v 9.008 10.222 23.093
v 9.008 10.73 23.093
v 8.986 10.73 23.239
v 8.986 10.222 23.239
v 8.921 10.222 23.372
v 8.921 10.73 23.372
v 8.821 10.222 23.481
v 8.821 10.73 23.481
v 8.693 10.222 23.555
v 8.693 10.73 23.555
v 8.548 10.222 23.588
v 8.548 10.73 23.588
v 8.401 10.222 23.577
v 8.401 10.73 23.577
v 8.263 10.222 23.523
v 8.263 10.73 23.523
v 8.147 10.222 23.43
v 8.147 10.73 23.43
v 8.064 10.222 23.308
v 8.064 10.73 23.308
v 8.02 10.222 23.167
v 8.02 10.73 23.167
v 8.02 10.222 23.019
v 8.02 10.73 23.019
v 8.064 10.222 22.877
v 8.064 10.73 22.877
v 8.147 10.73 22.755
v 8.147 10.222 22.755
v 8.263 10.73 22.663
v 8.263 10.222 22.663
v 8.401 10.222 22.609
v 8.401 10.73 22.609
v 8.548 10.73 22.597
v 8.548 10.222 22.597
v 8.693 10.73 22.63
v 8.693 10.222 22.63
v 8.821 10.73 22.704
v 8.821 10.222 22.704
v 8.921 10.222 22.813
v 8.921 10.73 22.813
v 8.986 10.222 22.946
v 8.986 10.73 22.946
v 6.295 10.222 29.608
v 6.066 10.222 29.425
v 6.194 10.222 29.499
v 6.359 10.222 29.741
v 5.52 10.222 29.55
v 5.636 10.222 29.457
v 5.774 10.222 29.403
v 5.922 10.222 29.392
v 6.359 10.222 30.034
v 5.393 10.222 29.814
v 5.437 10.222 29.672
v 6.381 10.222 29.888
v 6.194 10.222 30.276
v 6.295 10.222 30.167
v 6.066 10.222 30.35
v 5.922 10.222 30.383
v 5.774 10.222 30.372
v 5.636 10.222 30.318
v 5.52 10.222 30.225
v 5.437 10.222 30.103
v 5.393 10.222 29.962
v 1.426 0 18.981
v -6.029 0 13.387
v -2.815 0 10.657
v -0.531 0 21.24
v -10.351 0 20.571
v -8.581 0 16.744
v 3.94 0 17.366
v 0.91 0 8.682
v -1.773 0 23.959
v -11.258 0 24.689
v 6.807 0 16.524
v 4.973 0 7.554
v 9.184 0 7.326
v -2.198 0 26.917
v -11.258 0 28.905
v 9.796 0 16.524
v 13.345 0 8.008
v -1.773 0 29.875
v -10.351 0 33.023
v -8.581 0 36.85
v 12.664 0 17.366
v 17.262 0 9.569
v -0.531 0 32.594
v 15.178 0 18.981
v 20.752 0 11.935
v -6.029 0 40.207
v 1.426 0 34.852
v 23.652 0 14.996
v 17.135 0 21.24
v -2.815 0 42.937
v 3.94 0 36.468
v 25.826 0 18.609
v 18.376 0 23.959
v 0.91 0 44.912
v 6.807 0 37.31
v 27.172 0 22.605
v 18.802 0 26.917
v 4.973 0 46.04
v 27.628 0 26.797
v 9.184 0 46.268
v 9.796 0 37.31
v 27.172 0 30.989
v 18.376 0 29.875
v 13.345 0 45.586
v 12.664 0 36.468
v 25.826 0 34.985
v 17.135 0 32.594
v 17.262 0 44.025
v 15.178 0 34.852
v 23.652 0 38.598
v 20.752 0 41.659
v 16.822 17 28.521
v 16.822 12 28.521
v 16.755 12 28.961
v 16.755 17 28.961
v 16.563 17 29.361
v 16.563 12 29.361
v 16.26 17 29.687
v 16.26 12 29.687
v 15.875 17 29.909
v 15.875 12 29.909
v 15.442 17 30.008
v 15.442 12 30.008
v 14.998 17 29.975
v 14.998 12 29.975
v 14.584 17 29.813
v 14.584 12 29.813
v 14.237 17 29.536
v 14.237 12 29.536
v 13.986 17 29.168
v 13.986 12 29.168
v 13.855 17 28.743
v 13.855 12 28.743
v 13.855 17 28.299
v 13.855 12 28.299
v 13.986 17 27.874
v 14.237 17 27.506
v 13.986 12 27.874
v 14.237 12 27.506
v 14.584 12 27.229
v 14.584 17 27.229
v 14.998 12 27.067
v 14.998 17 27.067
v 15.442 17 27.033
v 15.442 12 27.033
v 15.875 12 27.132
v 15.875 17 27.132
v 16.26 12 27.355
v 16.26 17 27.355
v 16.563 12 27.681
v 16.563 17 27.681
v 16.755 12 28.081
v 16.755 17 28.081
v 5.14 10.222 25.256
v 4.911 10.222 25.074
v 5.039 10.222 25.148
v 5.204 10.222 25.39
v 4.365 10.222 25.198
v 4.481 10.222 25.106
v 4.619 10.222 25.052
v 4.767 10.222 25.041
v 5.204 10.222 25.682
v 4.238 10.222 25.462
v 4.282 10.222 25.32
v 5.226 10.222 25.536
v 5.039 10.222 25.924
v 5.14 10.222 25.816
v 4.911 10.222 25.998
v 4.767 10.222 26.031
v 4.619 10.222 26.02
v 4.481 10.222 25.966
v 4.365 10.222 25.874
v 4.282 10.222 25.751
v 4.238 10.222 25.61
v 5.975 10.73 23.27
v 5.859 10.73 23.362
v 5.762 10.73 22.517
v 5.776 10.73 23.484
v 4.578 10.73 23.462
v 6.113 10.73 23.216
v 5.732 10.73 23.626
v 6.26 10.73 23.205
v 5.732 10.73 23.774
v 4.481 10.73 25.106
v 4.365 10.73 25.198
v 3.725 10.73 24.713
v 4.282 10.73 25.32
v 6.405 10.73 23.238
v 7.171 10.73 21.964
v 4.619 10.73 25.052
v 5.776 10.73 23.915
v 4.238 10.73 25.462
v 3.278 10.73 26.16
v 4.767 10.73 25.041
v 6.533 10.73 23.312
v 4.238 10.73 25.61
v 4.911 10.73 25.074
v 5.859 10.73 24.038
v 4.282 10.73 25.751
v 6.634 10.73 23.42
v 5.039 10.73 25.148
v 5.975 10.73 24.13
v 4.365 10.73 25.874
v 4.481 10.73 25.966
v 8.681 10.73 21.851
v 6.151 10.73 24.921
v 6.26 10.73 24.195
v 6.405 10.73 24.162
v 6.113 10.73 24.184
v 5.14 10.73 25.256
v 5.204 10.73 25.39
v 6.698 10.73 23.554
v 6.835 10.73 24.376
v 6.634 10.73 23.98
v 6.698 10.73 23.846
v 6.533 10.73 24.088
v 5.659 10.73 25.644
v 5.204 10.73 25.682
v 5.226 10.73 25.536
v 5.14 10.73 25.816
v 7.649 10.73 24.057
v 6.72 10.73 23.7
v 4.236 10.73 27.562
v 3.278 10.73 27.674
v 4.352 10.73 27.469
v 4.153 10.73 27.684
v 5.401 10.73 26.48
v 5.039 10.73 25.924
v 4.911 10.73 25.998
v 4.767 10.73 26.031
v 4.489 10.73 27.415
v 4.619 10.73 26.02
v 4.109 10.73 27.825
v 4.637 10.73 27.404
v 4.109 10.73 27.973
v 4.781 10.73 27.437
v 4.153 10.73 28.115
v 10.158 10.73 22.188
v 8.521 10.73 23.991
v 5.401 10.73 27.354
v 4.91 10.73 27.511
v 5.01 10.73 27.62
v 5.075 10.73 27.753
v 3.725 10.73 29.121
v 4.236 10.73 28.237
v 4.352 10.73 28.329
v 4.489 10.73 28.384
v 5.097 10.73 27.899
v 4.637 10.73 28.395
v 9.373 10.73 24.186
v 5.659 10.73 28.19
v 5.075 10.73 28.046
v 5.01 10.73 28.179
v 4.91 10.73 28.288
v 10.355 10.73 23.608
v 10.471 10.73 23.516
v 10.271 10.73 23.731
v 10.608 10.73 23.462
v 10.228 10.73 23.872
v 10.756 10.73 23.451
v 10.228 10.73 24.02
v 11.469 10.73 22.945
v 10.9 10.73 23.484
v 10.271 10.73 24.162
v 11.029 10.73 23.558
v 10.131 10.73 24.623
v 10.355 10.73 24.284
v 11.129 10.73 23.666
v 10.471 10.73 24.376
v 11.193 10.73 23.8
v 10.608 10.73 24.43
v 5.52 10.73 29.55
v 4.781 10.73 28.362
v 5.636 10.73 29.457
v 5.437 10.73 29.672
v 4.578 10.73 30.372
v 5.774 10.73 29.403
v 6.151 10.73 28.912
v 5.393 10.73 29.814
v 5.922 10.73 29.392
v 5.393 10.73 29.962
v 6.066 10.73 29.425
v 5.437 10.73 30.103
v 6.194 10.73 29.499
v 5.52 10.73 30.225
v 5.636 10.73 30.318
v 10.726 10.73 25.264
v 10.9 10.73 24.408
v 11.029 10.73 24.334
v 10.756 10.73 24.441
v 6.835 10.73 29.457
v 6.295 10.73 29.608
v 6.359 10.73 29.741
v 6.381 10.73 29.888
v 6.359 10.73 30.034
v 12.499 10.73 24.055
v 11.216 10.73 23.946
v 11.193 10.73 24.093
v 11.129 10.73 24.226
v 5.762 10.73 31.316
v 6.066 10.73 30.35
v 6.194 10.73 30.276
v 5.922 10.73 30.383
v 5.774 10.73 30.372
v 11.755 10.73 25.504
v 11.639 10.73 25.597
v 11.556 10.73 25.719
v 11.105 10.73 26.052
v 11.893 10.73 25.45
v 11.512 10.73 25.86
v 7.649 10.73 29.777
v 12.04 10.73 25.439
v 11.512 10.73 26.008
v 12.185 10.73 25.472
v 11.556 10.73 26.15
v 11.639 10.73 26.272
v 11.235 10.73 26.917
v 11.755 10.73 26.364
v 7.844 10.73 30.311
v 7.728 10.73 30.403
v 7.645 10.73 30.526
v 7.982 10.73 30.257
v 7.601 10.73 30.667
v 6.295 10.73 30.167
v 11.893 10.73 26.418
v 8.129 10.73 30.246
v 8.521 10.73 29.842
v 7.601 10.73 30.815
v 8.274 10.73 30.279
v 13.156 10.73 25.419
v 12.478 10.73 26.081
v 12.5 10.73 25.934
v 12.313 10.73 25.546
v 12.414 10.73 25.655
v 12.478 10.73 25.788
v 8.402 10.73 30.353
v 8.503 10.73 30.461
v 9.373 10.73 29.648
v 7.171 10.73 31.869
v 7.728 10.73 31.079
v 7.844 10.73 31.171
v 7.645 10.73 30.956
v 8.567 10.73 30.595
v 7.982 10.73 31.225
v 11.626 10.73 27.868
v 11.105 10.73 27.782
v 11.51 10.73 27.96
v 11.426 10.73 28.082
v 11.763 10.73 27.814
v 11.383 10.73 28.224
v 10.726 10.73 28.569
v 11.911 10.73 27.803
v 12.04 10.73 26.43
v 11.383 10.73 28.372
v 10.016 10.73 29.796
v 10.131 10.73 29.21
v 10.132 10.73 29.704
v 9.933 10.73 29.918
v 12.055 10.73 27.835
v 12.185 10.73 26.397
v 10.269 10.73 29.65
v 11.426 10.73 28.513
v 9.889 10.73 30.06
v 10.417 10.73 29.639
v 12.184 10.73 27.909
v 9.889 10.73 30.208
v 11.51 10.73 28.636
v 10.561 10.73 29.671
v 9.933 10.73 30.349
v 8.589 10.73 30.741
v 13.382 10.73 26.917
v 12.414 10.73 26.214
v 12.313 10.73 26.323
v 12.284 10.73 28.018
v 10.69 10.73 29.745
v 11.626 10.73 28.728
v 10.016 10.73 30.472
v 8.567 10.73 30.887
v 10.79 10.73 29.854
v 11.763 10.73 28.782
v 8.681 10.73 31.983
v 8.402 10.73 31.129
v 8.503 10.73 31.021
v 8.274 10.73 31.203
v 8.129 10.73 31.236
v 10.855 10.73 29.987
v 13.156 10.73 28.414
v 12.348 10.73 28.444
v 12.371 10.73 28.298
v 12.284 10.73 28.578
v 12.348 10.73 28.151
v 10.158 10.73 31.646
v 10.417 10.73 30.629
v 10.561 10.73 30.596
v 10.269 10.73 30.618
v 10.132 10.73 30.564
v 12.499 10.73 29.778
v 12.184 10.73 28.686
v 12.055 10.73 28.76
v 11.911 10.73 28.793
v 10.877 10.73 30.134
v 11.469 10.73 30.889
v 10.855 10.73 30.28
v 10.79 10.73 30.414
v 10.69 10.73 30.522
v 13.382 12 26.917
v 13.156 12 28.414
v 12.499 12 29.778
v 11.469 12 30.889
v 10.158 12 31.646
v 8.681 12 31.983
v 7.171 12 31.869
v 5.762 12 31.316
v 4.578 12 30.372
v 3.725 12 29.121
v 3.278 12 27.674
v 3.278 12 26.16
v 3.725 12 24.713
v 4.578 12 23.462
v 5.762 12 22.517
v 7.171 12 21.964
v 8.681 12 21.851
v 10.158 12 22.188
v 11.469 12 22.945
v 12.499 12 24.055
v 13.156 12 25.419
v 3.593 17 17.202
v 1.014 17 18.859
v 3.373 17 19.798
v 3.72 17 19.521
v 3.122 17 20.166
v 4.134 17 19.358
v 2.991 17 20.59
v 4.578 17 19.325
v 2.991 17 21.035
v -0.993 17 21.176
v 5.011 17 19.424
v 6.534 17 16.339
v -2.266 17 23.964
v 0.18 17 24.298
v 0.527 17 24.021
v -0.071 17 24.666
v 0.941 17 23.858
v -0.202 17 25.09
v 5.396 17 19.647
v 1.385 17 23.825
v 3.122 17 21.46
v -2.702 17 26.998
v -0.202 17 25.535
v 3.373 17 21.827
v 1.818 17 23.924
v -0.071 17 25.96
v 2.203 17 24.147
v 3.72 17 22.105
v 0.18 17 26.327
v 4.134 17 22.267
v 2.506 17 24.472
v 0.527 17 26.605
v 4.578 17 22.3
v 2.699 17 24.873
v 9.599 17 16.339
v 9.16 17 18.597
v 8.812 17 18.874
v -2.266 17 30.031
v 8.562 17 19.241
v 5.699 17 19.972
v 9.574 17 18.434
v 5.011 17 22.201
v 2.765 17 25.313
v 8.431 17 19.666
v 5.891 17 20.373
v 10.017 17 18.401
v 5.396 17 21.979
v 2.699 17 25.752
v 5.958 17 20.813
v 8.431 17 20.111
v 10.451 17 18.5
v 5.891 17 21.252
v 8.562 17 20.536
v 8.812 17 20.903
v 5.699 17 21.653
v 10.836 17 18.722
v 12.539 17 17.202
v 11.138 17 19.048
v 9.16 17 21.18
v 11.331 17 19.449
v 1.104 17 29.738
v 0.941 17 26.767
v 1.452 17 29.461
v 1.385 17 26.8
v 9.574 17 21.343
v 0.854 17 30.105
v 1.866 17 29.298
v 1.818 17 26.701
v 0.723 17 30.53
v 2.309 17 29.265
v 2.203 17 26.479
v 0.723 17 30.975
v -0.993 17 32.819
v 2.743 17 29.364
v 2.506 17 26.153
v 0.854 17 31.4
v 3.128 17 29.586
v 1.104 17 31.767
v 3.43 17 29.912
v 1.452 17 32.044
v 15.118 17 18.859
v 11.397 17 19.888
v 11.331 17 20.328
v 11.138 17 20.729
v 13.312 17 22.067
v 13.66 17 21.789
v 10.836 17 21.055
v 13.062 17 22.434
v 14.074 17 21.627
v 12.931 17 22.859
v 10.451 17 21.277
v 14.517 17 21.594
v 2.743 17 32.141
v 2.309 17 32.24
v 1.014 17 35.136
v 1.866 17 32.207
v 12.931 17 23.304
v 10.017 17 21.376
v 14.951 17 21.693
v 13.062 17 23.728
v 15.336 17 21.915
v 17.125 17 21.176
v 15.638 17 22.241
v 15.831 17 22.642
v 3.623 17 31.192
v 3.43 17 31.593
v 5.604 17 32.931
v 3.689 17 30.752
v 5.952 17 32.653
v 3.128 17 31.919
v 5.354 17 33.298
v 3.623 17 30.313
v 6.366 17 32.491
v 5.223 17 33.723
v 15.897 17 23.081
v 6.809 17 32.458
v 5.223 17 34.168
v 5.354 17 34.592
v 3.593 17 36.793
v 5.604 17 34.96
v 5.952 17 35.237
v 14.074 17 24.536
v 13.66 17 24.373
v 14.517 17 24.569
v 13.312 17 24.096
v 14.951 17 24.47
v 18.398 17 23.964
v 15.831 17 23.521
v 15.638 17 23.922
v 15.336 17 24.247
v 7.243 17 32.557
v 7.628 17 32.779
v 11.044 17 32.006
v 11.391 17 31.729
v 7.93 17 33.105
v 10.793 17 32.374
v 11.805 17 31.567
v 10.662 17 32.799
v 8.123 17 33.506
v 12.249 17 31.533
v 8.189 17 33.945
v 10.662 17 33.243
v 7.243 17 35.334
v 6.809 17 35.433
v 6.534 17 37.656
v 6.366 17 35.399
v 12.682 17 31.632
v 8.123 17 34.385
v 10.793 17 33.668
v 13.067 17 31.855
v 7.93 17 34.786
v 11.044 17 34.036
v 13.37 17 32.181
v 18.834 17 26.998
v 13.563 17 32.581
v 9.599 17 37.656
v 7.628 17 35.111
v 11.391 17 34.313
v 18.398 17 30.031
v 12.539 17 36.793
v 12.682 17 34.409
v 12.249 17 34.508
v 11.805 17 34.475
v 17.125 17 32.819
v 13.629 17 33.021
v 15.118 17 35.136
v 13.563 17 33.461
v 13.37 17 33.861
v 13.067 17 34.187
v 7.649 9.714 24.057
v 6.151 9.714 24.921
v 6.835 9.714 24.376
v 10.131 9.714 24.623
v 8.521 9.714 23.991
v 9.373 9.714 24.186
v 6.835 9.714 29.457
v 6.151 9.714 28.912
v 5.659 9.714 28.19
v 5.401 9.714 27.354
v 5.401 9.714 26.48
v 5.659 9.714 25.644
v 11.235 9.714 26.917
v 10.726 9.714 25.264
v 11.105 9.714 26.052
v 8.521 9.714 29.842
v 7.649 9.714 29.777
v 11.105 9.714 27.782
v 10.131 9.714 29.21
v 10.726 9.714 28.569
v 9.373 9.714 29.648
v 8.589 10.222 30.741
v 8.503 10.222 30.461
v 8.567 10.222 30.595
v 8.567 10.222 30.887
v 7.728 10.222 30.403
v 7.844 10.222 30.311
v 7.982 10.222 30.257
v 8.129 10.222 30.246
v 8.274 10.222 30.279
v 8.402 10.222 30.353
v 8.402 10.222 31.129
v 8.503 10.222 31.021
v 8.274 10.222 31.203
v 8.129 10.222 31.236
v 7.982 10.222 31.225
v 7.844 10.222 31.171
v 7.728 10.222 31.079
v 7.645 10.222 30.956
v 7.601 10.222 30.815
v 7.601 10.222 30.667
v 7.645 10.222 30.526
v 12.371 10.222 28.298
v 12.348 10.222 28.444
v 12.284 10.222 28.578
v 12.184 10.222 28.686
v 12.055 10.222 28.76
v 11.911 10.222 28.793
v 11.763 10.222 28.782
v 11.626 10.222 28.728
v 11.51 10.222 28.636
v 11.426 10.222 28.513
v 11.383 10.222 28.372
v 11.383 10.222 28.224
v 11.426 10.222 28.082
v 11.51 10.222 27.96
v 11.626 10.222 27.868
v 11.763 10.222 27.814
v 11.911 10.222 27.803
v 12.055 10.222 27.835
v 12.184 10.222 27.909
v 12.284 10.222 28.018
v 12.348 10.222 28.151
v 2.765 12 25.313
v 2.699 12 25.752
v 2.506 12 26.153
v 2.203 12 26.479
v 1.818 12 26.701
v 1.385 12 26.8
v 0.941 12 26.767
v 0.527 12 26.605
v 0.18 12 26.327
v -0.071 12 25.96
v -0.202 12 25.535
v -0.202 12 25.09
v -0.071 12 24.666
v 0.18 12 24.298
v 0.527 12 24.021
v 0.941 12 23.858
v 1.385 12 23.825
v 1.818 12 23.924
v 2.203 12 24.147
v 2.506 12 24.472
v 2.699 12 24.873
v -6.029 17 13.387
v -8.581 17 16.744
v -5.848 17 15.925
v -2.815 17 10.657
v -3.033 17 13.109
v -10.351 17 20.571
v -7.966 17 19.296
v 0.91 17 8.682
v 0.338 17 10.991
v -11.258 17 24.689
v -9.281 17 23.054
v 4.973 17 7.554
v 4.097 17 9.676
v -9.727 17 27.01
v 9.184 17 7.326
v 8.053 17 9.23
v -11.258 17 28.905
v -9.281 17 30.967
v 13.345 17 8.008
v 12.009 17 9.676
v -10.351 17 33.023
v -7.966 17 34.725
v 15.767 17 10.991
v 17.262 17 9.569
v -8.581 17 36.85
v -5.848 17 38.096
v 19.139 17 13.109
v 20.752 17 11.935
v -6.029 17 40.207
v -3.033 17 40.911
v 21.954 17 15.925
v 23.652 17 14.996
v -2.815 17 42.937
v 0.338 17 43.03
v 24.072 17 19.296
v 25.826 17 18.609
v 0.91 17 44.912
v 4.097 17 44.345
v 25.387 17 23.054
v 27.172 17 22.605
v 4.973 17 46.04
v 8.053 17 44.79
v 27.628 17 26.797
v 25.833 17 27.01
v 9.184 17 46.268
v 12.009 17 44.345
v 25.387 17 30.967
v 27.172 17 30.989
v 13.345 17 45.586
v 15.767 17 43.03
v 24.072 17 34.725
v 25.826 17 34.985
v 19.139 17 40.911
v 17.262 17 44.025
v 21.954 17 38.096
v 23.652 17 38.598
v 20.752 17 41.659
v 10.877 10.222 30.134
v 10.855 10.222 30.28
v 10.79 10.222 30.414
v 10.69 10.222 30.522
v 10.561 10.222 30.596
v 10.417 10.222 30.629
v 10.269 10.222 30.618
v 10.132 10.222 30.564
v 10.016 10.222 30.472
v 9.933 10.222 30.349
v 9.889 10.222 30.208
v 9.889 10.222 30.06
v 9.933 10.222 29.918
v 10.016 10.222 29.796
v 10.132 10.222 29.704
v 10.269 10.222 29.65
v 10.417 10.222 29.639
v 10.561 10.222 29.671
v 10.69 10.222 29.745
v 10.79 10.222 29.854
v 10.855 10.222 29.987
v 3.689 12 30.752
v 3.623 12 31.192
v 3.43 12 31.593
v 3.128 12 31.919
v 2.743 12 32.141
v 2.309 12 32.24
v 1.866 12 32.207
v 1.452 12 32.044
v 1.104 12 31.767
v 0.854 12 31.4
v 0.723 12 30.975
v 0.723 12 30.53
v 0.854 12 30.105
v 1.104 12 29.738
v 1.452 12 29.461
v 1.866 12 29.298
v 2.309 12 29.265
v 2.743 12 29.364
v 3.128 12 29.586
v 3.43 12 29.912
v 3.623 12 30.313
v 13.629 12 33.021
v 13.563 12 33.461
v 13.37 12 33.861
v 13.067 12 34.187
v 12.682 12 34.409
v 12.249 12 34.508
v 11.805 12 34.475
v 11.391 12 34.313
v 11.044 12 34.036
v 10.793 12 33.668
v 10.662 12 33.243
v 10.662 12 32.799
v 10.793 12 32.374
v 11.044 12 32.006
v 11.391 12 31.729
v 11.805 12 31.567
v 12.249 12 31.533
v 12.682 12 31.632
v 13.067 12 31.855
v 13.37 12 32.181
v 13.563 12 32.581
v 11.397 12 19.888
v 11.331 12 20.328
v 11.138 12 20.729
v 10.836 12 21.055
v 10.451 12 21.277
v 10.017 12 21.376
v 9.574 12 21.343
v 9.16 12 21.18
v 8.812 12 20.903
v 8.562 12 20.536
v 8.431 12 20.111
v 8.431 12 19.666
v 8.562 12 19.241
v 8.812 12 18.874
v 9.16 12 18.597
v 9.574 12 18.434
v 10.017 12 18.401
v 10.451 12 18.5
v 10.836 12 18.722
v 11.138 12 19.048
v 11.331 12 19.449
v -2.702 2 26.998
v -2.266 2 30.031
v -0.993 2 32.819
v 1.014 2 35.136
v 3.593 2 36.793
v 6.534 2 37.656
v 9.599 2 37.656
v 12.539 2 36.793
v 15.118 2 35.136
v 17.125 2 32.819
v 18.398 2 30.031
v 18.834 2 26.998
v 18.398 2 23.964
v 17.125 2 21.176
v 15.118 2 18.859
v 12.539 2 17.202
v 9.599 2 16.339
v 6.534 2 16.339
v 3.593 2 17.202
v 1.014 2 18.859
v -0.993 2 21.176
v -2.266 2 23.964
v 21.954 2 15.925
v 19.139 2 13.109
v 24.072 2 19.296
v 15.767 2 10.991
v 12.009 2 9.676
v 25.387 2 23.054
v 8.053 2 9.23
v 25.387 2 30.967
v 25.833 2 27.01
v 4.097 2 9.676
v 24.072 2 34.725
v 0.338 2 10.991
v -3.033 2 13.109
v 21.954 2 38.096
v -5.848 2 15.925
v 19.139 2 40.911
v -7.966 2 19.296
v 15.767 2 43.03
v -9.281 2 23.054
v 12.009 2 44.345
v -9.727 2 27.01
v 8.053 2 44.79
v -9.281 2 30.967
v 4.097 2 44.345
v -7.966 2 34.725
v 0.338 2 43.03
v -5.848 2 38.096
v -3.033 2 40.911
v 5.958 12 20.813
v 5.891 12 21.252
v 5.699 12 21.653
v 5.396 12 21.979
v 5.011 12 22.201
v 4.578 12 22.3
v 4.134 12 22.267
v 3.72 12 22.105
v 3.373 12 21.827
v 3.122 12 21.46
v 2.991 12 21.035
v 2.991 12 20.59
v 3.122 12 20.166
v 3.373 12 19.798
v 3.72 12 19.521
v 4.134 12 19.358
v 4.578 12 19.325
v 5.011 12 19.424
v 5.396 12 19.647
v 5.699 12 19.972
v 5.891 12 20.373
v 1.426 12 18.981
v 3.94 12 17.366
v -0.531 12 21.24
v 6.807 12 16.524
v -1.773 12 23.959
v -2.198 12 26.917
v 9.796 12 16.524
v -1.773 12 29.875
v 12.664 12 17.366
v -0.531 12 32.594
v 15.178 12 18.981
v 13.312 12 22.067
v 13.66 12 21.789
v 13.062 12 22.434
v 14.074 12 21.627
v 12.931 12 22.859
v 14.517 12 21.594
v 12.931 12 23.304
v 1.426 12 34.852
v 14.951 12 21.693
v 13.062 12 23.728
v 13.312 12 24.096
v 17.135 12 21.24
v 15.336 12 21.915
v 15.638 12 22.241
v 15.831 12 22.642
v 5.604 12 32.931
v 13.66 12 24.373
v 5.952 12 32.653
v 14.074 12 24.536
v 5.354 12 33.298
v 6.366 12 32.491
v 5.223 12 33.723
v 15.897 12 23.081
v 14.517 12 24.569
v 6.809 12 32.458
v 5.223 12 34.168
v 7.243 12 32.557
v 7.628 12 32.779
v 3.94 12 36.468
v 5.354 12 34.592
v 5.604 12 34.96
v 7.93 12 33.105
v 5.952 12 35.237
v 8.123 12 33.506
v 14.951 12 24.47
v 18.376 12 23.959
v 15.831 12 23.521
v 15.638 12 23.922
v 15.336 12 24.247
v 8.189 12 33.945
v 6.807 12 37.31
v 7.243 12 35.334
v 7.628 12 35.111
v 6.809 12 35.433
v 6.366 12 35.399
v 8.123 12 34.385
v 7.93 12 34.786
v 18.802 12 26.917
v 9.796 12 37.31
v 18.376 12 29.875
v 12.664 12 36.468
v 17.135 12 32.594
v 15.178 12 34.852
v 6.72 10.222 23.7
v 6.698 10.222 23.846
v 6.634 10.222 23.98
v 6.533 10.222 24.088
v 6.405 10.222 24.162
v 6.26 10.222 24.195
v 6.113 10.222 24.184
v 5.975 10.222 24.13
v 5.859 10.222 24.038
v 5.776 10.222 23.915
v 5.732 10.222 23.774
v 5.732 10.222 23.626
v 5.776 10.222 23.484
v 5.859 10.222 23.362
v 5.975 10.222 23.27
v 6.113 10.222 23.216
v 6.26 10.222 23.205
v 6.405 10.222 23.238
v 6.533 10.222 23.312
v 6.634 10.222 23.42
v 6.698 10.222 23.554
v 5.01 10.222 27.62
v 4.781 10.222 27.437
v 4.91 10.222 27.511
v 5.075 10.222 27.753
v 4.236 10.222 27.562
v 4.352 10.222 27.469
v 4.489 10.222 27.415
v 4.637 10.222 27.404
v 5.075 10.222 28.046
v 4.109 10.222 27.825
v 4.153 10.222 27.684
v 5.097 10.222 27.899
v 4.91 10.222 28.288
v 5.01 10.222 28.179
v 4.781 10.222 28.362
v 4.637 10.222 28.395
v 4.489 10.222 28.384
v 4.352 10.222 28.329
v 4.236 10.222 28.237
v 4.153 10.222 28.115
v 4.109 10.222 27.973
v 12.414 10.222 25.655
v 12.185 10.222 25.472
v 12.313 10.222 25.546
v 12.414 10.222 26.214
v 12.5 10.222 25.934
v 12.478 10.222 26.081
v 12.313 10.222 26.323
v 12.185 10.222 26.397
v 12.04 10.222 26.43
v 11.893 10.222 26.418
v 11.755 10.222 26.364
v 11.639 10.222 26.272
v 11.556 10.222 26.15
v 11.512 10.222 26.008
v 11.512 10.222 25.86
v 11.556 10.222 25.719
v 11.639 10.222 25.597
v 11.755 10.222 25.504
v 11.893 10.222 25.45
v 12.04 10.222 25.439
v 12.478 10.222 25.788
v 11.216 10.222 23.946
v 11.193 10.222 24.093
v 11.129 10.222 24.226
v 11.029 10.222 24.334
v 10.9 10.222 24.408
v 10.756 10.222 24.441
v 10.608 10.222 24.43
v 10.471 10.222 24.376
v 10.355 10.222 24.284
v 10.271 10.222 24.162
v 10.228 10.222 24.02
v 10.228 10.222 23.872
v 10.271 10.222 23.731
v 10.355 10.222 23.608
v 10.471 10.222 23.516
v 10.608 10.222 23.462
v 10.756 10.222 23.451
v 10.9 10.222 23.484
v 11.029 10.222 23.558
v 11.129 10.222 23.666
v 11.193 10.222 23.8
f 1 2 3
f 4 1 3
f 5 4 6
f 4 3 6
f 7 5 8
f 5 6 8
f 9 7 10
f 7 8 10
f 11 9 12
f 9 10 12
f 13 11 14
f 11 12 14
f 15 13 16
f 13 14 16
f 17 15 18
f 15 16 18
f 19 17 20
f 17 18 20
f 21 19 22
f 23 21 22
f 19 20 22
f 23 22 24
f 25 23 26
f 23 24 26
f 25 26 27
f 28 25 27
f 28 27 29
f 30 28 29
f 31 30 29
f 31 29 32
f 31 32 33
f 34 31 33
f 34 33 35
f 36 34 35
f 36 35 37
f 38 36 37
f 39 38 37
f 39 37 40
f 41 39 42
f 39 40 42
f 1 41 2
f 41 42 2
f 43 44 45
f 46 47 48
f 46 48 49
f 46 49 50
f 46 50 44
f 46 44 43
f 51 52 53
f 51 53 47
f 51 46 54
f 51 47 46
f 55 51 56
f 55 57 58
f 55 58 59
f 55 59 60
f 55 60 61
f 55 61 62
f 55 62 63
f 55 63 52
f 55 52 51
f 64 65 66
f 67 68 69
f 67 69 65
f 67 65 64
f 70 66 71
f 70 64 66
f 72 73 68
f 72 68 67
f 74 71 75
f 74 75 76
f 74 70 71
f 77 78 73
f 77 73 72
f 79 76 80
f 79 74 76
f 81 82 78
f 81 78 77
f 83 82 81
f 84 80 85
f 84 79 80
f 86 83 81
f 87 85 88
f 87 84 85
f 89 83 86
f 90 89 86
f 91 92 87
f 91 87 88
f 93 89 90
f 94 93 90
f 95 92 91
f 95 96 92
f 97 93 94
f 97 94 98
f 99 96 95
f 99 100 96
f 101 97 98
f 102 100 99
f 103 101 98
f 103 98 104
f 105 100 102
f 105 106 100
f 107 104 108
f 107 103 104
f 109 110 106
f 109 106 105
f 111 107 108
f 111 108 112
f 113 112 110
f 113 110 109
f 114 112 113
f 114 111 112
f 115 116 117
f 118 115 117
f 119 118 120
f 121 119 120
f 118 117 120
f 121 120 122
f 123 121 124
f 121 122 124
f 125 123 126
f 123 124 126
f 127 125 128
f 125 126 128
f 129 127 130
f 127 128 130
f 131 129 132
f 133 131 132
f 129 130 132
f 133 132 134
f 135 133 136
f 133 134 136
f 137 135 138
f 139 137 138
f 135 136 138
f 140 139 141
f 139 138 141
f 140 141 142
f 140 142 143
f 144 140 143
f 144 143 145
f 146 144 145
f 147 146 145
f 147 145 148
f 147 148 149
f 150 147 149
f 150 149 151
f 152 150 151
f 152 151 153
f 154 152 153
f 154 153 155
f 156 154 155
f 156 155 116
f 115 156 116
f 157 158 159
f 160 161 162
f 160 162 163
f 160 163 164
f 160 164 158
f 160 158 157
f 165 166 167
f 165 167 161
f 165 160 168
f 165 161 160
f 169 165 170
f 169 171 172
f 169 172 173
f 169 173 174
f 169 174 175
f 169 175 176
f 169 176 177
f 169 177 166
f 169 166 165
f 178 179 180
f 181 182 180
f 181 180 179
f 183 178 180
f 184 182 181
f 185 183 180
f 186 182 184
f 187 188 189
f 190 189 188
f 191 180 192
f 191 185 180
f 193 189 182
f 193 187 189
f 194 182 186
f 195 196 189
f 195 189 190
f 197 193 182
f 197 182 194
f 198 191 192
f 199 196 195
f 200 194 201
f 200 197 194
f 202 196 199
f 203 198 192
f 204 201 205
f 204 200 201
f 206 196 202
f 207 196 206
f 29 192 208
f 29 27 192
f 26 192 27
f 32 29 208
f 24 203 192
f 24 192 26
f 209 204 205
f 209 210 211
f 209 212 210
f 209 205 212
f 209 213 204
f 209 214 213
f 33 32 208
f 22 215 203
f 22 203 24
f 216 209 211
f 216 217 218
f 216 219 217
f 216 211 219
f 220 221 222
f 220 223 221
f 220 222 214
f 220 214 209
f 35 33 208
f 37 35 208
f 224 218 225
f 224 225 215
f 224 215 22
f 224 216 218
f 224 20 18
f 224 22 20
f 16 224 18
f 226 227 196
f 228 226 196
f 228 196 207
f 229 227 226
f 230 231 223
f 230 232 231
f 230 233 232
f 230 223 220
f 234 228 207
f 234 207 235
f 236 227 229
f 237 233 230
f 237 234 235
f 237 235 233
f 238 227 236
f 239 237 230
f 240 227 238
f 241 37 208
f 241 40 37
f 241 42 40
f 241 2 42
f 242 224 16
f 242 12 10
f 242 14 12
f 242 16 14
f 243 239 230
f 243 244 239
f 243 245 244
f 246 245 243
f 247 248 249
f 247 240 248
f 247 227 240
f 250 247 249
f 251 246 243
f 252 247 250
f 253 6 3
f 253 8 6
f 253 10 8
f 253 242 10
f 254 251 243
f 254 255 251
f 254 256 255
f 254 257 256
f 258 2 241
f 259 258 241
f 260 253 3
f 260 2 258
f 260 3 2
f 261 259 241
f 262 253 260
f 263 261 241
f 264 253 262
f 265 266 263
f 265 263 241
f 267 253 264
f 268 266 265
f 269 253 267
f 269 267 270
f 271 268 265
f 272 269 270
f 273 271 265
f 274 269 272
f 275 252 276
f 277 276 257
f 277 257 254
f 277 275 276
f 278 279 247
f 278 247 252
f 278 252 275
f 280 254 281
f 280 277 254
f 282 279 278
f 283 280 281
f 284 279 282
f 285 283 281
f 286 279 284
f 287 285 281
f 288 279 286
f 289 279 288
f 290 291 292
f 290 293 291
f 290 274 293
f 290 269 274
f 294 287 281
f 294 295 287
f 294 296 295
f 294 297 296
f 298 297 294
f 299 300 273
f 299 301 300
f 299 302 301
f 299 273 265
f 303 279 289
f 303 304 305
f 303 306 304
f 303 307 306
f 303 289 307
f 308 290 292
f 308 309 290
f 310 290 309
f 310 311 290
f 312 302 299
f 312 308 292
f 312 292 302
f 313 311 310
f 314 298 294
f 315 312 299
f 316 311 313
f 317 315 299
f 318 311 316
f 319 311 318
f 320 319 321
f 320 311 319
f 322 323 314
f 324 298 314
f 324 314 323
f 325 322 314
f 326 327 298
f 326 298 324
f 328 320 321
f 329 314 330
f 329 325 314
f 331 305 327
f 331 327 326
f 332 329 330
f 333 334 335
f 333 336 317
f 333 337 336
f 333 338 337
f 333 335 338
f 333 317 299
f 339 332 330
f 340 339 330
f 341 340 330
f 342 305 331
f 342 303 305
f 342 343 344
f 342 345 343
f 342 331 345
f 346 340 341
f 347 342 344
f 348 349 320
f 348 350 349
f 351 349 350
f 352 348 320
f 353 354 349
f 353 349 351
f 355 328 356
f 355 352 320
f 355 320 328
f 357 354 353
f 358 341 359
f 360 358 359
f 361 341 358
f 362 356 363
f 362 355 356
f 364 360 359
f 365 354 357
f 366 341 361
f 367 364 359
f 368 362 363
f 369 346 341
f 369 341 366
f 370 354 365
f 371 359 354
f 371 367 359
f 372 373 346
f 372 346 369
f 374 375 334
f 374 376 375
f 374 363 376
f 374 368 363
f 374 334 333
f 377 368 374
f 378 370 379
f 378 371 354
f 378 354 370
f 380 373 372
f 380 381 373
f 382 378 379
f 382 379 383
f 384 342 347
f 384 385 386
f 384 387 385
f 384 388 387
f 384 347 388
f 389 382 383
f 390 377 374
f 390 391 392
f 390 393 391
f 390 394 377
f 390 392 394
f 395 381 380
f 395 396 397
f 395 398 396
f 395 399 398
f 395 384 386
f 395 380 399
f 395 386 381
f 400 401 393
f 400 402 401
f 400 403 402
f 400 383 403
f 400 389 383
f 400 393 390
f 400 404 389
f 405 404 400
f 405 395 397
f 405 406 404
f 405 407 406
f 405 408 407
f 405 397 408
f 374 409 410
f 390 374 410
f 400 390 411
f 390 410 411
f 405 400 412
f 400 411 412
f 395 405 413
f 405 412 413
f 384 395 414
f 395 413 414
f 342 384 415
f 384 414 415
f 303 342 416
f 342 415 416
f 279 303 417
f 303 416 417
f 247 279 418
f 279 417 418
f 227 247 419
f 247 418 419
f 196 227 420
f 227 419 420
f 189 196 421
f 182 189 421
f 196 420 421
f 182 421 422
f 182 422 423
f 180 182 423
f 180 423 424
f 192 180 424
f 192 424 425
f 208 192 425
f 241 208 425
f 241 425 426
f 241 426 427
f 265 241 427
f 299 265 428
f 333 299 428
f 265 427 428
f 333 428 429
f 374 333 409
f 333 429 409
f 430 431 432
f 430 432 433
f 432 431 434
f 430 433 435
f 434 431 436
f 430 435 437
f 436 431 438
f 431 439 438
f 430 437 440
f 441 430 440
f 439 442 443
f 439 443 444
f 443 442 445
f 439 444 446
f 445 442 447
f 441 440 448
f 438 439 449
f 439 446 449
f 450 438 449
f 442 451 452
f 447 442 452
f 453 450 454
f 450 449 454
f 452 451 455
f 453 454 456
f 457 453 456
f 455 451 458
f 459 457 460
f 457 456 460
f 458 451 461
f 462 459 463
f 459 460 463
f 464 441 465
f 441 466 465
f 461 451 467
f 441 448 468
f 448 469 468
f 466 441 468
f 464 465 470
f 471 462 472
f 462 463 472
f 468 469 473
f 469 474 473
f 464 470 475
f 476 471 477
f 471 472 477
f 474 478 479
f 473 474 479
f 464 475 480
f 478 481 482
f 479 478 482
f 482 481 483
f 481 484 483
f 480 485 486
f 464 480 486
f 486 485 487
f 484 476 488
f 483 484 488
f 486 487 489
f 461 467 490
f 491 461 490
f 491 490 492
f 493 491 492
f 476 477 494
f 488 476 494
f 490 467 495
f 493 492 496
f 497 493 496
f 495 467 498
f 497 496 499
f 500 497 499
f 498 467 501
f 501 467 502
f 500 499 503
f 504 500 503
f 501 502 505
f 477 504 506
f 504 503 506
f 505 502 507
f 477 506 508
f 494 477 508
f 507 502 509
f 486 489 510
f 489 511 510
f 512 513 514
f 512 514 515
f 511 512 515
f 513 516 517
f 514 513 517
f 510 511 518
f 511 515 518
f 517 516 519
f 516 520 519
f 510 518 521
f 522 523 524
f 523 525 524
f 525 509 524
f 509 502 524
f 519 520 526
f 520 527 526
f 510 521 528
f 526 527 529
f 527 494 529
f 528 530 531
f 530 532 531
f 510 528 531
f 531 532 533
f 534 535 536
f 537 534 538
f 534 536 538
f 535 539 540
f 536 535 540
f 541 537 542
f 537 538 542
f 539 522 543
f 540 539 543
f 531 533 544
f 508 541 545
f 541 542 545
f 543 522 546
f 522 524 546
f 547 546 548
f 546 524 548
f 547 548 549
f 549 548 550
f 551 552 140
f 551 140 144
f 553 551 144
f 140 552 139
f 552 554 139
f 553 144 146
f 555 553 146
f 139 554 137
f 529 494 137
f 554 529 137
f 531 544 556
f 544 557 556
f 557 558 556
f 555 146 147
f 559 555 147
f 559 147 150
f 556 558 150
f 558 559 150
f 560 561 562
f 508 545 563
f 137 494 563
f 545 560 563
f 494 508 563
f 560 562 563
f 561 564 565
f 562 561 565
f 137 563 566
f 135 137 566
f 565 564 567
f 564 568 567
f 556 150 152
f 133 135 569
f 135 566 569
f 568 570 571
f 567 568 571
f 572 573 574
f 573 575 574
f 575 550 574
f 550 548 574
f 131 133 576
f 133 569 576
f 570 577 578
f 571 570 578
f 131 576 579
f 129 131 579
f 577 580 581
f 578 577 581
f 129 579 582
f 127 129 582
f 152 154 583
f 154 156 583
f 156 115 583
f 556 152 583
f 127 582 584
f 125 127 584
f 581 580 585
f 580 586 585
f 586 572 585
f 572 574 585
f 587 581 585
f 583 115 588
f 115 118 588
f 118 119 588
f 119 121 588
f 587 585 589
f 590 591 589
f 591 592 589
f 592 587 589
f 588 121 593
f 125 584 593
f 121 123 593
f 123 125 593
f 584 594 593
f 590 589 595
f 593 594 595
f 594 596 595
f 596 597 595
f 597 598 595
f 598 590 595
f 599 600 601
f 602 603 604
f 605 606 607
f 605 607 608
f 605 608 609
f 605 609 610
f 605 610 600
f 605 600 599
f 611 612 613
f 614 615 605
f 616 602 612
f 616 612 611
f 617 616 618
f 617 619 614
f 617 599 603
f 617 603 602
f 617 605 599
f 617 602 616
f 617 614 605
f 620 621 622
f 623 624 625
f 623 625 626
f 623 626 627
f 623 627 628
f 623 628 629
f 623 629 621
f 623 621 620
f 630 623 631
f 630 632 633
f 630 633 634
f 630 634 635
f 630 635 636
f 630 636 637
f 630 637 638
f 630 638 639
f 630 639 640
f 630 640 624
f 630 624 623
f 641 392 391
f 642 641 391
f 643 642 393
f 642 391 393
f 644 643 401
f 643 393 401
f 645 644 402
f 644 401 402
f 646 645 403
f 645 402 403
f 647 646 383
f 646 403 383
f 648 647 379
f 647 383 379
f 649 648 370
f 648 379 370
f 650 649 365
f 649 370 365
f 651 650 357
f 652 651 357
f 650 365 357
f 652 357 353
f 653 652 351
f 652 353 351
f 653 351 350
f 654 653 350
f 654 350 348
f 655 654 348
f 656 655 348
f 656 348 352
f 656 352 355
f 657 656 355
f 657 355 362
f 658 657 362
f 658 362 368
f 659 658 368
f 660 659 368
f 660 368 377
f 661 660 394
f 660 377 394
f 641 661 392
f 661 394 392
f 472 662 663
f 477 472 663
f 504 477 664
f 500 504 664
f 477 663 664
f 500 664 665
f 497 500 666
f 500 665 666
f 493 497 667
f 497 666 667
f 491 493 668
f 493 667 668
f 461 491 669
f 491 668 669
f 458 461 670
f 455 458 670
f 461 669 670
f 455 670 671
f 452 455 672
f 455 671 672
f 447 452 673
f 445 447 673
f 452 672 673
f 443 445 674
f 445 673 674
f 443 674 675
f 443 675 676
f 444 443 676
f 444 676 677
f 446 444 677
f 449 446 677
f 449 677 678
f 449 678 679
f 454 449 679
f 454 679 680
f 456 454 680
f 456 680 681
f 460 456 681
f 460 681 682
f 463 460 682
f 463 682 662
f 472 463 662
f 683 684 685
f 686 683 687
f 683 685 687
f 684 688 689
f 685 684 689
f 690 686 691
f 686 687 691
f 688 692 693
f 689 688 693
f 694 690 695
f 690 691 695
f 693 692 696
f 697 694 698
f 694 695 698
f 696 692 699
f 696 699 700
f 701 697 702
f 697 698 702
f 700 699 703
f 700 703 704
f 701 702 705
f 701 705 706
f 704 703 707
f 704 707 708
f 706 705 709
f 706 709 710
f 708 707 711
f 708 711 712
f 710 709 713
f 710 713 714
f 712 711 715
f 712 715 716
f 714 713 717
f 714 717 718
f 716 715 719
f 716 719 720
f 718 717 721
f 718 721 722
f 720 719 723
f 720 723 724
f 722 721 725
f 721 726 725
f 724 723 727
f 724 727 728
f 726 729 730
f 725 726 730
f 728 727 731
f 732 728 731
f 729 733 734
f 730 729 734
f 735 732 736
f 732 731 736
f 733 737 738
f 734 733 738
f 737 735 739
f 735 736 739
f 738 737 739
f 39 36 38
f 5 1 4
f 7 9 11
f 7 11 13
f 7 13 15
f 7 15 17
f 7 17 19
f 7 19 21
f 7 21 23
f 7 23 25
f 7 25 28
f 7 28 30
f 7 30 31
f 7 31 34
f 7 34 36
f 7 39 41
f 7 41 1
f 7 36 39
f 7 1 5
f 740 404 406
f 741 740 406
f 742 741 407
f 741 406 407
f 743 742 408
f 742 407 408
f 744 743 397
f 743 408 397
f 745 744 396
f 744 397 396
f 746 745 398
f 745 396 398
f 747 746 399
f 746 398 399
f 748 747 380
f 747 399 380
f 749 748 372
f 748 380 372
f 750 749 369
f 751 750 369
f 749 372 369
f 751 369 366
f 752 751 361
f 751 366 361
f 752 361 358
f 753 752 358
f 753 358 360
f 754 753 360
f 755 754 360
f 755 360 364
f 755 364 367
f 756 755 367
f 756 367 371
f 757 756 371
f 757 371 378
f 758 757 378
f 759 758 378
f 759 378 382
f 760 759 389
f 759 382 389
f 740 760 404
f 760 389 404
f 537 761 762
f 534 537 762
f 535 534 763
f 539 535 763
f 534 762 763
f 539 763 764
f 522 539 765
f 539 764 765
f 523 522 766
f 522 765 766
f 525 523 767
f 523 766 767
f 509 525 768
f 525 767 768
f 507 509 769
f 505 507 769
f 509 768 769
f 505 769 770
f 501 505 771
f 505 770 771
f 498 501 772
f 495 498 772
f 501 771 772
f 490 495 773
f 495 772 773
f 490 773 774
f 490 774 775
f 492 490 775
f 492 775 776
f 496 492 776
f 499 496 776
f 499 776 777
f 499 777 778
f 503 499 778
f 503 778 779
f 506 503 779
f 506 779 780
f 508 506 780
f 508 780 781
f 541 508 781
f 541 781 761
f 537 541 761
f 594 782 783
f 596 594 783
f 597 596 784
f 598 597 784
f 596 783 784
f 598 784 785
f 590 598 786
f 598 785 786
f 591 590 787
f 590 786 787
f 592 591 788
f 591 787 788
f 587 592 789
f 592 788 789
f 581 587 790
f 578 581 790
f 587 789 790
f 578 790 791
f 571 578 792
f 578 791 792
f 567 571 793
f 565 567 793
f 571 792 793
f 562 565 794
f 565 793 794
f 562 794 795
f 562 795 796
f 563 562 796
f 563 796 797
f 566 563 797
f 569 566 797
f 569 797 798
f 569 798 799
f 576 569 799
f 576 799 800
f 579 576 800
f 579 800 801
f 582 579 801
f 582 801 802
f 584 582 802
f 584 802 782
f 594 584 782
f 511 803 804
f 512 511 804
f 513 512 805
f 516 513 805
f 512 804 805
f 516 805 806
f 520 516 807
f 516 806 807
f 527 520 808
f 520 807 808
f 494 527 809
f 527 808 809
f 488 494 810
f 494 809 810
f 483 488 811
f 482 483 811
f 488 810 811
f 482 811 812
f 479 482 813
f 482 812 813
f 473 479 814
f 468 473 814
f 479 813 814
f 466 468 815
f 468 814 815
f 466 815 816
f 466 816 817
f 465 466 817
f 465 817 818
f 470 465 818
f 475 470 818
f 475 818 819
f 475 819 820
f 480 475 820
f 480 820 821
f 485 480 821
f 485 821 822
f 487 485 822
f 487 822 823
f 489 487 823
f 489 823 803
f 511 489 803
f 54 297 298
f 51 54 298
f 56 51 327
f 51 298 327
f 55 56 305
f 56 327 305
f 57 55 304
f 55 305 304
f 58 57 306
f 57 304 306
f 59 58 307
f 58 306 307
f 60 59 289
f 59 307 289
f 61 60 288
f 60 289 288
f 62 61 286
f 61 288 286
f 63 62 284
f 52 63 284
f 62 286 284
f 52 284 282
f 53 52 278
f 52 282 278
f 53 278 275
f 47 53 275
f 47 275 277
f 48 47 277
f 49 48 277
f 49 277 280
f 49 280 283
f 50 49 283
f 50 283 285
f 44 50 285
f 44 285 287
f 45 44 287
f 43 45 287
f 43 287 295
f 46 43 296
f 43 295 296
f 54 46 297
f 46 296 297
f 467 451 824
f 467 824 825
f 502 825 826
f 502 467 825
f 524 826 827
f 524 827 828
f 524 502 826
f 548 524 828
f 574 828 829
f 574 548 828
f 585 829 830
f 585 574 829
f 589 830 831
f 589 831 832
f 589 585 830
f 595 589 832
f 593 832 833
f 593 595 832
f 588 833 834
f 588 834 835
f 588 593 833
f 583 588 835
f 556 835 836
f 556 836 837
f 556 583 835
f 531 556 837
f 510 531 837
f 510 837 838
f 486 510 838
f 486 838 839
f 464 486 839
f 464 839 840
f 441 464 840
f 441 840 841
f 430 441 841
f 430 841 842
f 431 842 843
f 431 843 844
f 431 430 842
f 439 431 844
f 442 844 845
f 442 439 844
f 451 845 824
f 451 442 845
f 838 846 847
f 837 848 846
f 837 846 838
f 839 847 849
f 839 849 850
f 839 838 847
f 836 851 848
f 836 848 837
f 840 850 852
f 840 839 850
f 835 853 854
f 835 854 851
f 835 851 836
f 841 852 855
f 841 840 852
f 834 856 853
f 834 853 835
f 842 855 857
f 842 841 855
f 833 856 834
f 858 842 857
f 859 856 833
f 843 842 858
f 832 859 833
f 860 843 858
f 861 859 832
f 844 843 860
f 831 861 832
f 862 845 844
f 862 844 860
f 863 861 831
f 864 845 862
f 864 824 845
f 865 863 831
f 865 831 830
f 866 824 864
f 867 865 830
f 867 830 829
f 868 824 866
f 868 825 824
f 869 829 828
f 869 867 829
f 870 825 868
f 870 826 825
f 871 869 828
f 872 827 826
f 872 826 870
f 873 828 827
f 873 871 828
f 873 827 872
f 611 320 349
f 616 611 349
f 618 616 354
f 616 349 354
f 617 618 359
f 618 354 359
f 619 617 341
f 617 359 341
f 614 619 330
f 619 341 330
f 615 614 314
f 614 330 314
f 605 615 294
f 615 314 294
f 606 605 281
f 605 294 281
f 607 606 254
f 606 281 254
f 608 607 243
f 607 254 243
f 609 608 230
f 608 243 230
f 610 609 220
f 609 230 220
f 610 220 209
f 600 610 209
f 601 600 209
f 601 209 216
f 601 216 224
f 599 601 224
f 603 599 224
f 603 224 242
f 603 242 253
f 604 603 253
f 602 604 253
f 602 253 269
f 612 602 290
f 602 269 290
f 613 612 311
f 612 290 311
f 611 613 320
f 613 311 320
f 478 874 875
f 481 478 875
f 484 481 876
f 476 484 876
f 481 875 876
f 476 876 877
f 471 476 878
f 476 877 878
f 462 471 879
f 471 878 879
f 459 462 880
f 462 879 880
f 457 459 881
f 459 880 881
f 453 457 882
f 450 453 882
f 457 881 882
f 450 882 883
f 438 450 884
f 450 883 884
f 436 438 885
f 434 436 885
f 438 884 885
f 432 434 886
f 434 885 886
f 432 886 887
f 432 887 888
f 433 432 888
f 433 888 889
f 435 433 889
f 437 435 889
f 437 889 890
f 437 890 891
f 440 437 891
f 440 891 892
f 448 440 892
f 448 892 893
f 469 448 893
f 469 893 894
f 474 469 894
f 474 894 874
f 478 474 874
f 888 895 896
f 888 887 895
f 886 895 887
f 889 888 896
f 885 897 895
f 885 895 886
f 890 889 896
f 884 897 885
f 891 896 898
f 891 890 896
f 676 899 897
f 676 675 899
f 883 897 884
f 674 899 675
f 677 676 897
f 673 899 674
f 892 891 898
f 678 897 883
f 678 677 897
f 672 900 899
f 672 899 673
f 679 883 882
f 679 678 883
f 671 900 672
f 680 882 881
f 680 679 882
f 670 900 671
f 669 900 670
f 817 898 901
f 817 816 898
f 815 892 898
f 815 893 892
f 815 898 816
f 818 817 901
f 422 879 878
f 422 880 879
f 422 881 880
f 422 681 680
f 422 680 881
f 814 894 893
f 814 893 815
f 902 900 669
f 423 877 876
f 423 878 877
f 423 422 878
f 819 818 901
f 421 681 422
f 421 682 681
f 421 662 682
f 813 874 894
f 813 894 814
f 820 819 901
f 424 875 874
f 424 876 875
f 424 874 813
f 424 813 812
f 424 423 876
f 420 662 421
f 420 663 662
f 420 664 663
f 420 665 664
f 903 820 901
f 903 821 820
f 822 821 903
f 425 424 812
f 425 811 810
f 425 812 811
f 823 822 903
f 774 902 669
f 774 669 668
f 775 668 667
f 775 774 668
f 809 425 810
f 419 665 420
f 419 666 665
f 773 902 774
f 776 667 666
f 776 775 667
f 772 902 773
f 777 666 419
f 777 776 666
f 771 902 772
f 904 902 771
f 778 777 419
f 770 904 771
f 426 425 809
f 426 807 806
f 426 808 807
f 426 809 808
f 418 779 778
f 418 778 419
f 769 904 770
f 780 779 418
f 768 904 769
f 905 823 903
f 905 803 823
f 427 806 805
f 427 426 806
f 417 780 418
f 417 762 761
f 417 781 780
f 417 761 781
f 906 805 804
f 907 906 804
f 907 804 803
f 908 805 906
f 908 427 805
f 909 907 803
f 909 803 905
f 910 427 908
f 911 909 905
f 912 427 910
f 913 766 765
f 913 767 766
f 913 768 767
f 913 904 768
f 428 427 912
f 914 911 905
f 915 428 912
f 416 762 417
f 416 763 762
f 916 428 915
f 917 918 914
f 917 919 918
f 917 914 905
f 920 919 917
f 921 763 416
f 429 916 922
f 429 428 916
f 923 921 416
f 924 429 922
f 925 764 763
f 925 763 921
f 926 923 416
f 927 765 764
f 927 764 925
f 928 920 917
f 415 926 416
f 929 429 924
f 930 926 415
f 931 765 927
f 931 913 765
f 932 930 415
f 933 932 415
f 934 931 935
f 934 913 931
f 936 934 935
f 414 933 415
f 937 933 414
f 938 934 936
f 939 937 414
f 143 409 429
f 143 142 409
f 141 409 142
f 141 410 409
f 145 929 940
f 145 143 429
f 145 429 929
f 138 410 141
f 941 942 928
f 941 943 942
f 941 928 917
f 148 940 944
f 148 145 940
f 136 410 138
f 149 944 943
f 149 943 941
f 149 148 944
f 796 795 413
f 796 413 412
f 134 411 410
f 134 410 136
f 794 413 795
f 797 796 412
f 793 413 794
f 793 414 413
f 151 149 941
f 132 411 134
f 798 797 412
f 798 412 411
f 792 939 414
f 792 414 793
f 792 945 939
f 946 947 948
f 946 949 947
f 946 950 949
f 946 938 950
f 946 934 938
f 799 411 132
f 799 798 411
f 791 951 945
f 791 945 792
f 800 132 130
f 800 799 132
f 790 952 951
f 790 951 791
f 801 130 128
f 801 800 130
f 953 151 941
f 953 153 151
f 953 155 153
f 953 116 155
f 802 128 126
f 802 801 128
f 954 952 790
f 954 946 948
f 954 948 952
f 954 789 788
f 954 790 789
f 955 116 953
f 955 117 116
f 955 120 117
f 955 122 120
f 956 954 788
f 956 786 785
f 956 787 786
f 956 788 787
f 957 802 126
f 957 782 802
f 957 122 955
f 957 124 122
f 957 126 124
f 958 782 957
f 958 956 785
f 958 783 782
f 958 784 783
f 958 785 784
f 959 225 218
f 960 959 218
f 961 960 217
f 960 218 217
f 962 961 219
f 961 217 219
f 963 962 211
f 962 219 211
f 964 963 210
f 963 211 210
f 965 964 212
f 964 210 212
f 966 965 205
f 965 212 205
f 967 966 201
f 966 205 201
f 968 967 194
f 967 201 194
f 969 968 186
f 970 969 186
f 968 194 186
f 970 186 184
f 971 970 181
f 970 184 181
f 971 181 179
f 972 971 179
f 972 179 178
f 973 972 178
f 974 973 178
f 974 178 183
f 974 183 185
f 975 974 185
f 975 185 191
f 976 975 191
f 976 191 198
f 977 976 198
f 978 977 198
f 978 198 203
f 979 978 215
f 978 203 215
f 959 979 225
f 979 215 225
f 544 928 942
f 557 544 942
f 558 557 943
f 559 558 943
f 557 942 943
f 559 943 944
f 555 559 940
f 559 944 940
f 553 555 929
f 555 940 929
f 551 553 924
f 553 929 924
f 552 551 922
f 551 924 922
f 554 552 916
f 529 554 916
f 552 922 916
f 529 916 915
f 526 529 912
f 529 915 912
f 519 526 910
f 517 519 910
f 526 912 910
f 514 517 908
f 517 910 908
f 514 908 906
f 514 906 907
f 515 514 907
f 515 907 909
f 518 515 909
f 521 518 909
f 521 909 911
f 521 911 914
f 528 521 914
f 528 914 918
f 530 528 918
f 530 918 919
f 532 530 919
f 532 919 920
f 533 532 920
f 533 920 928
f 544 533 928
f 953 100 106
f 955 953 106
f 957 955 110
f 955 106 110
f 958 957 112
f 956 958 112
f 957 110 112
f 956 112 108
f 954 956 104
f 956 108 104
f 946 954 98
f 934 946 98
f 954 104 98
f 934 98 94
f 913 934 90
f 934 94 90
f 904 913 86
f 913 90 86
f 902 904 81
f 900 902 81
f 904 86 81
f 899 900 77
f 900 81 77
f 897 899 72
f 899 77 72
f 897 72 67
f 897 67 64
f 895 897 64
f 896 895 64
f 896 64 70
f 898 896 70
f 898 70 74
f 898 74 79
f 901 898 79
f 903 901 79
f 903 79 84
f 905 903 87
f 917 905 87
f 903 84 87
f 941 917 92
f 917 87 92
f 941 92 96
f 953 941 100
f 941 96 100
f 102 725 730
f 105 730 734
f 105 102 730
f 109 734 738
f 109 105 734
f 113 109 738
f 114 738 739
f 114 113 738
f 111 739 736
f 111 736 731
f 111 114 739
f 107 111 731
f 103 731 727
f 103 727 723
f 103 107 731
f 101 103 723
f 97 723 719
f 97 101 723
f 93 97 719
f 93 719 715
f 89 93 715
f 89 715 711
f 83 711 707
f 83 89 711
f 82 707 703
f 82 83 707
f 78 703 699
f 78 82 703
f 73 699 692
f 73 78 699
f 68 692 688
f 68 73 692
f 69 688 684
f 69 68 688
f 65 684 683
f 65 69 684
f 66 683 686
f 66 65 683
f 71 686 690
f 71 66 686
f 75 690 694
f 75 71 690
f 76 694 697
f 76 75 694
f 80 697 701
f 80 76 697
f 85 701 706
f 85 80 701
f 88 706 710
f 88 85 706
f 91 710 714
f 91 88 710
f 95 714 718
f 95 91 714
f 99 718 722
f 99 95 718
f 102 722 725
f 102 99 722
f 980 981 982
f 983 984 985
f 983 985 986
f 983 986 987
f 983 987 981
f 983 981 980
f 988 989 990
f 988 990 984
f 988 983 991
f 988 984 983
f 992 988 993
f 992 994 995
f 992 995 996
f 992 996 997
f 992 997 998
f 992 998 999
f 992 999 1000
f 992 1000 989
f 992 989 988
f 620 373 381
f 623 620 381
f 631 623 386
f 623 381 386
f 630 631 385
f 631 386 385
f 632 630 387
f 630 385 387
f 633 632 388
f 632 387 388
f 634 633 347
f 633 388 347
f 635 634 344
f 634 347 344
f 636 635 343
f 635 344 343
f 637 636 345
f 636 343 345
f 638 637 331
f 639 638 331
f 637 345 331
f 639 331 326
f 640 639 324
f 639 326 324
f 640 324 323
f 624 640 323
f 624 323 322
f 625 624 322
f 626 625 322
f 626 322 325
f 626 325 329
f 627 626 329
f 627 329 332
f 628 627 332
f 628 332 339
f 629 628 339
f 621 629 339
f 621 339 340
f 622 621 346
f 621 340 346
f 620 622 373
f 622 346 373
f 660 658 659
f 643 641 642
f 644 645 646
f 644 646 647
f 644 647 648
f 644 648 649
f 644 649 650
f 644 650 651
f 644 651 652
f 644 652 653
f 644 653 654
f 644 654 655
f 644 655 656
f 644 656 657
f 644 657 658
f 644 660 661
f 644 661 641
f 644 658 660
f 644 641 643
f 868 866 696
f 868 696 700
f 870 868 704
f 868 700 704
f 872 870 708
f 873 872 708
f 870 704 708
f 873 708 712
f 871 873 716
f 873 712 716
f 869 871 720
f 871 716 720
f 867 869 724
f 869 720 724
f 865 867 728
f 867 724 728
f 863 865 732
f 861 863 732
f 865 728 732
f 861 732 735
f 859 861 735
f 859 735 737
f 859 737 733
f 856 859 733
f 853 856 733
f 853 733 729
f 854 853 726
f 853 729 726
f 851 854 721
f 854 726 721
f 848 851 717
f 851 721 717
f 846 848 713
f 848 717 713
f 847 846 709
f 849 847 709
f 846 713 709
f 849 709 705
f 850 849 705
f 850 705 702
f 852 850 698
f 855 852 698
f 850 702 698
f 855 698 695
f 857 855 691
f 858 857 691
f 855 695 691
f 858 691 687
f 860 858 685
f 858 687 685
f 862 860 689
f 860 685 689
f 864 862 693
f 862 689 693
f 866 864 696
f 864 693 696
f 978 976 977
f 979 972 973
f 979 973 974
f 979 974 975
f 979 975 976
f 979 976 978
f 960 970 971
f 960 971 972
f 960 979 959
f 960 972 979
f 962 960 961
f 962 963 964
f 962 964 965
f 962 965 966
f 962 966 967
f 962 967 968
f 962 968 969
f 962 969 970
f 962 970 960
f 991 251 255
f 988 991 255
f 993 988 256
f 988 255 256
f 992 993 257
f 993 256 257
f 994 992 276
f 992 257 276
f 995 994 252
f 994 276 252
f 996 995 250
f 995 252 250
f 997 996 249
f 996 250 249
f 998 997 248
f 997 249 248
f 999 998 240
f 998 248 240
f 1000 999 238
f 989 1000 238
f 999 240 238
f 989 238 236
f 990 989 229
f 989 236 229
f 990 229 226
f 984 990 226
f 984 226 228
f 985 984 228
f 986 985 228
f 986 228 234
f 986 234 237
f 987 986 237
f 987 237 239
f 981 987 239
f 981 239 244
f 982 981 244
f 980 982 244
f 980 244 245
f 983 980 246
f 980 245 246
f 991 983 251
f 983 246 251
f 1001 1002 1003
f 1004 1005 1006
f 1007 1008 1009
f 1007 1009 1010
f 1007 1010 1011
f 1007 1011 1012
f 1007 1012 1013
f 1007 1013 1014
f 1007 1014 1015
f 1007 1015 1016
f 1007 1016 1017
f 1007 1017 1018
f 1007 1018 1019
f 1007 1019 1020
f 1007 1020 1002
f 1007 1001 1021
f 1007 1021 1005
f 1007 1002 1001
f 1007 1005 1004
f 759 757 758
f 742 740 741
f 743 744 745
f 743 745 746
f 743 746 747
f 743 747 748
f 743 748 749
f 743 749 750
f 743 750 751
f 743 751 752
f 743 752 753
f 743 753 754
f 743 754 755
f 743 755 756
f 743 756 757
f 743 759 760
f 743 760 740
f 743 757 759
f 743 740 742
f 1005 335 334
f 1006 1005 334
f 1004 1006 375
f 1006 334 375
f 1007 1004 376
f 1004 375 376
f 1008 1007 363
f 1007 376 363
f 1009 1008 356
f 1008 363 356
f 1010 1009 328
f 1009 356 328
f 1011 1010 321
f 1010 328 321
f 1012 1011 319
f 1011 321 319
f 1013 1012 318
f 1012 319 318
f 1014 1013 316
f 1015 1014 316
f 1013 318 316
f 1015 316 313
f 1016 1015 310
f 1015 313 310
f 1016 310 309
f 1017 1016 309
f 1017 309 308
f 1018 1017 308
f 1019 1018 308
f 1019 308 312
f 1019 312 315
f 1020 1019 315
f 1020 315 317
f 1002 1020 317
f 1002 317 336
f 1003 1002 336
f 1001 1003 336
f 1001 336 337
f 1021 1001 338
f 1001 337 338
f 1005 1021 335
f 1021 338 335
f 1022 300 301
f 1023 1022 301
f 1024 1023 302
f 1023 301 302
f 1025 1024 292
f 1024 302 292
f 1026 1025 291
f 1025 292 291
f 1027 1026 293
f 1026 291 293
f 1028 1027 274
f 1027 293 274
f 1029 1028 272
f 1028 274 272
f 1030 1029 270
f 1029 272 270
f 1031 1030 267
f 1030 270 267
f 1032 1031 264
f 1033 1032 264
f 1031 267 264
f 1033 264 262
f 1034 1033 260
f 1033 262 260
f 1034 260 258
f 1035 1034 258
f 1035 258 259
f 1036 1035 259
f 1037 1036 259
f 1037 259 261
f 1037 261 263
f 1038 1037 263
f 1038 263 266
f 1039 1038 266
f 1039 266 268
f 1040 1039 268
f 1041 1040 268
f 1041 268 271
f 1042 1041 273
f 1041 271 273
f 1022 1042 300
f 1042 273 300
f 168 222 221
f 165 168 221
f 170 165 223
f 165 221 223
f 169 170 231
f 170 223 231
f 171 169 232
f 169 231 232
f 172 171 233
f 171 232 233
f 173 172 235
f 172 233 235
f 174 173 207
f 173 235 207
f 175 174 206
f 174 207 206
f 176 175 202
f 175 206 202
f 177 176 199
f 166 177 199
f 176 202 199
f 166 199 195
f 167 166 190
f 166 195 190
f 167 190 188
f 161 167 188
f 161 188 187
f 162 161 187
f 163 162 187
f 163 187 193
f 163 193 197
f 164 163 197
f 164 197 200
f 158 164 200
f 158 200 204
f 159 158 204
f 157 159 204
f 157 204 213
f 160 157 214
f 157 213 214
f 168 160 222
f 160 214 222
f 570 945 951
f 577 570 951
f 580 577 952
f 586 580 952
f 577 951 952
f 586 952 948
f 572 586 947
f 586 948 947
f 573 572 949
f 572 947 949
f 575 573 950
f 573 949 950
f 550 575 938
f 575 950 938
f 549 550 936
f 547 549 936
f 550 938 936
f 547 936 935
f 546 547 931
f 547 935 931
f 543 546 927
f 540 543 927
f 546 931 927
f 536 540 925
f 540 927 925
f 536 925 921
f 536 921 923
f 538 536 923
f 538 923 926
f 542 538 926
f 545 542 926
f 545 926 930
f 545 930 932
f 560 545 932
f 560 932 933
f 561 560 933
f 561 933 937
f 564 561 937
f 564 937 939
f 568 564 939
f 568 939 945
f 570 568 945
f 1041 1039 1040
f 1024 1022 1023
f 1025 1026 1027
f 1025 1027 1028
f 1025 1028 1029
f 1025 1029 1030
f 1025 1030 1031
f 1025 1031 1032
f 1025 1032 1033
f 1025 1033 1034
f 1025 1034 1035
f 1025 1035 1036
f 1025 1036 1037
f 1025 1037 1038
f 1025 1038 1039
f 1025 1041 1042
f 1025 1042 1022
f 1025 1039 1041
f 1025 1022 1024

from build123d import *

# Parameters (mm, degrees)
F0_R      = 19.499961
F2_DEPTH  = 16.9999914
F1_R      = 10.5000044
F3_DEPTH  = 12.0000014
F4_R      = 1.4916301958
F5_DEPTH  = 25.4
F7_R      = 17.78
F7_R_2    = 10.7683059636
F8_DEPTH  = 14.9999954
F9_R      = 5.08
F10_DEPTH = 1.27
F13_R     = 2.9336630642
F14_DEPTH = 1.016
F15_R     = 0.4966201378
F16_DEPTH = 0.508


# Not quite as in the source:
# - the program builds the solid bodies; features that only make, move or delete a surface that nothing else refers to are left out


with BuildPart() as f2:
    # F0 (on Front) → F2 (new body)
    with BuildSketch(Plane.XZ):
        with Locations((8.1280004233, 26.7970003188)):
            Circle(F0_R)
    extrude(amount=-F2_DEPTH)

    # F1 (on face) → F3 (cut)
    with BuildSketch(Plane.XZ):
        with Locations((8.3016715726, 26.9168310782)):
            Circle(F1_R)
    extrude(amount=-F3_DEPTH, mode=Mode.SUBTRACT)

    # F4 (on face) → F5 (cut)
    with BuildSketch(Plane.XZ.offset(-12.0000014)):
        with Locations((6.6975592636, 33.9452400804)):
            Circle(F4_R)
        with Locations((12.1372285474, 33.0209454361)):
            Circle(F4_R)
        with Locations((15.3300805747, 28.5209433873)):
            Circle(F4_R)
        with Locations((14.4057859305, 23.0812741034)):
            Circle(F4_R)
        with Locations((9.9057838817, 19.8884220761)):
            Circle(F4_R)
        with Locations((4.4661145978, 20.8127167204)):
            Circle(F4_R)
        with Locations((1.2732625705, 25.3127187692)):
            Circle(F4_R)
        with Locations((2.1975572148, 30.7523880531)):
            Circle(F4_R)
    extrude(amount=-F5_DEPTH, mode=Mode.SUBTRACT)

    # F7 (on face) → F8 (cut)
    with BuildSketch(Plane(origin=(0, 16.9999914, 0), x_dir=(-1, 0, 0), z_dir=(0, 1, 0))):
        with Locations((-8.0529511662, 27.0102884156)):
            Circle(F7_R)
        with Locations((-8.0660926178, 26.997640729)):
            Circle(F7_R_2, mode=Mode.SUBTRACT)
    extrude(amount=-F8_DEPTH, mode=Mode.SUBTRACT)

    # F9 (on face) → F10 (join)
    with BuildSketch(Plane.XZ.offset(-12.0000014)):
        with Locations((8.3016715726, 26.9168310782)):
            Circle(F9_R)
    extrude(amount=F10_DEPTH)

    # F13 (on face) → F14 (join)
    with BuildSketch(Plane.XZ.offset(-10.7300014)):
        with Locations((8.3016715726, 26.9168310782)):
            Circle(F13_R)
    extrude(amount=F14_DEPTH)

    # F15 (on face) → F16 (join)
    with BuildSketch(Plane.XZ.offset(-10.7300014)):
        with Locations((8.092216216, 30.7409893721)):
            Circle(F15_R)
        with Locations((10.3800024772, 30.1337548968)):
            Circle(F15_R)
        with Locations((11.8739369726, 28.297764862)):
            Circle(F15_R)
        with Locations((12.0033875021, 25.934305058)):
            Circle(F15_R)
        with Locations((10.7189083633, 23.9461367989)):
            Circle(F15_R)
        with Locations((8.5111269292, 23.0926727844)):
            Circle(F15_R)
        with Locations((6.2233406681, 23.6999072597)):
            Circle(F15_R)
        with Locations((4.7294061726, 25.5358972945)):
            Circle(F15_R)
        with Locations((4.5999556431, 27.8993570985)):
            Circle(F15_R)
        with Locations((5.884434782, 29.8875253576)):
            Circle(F15_R)
    extrude(amount=F16_DEPTH)


solid = f2.part
